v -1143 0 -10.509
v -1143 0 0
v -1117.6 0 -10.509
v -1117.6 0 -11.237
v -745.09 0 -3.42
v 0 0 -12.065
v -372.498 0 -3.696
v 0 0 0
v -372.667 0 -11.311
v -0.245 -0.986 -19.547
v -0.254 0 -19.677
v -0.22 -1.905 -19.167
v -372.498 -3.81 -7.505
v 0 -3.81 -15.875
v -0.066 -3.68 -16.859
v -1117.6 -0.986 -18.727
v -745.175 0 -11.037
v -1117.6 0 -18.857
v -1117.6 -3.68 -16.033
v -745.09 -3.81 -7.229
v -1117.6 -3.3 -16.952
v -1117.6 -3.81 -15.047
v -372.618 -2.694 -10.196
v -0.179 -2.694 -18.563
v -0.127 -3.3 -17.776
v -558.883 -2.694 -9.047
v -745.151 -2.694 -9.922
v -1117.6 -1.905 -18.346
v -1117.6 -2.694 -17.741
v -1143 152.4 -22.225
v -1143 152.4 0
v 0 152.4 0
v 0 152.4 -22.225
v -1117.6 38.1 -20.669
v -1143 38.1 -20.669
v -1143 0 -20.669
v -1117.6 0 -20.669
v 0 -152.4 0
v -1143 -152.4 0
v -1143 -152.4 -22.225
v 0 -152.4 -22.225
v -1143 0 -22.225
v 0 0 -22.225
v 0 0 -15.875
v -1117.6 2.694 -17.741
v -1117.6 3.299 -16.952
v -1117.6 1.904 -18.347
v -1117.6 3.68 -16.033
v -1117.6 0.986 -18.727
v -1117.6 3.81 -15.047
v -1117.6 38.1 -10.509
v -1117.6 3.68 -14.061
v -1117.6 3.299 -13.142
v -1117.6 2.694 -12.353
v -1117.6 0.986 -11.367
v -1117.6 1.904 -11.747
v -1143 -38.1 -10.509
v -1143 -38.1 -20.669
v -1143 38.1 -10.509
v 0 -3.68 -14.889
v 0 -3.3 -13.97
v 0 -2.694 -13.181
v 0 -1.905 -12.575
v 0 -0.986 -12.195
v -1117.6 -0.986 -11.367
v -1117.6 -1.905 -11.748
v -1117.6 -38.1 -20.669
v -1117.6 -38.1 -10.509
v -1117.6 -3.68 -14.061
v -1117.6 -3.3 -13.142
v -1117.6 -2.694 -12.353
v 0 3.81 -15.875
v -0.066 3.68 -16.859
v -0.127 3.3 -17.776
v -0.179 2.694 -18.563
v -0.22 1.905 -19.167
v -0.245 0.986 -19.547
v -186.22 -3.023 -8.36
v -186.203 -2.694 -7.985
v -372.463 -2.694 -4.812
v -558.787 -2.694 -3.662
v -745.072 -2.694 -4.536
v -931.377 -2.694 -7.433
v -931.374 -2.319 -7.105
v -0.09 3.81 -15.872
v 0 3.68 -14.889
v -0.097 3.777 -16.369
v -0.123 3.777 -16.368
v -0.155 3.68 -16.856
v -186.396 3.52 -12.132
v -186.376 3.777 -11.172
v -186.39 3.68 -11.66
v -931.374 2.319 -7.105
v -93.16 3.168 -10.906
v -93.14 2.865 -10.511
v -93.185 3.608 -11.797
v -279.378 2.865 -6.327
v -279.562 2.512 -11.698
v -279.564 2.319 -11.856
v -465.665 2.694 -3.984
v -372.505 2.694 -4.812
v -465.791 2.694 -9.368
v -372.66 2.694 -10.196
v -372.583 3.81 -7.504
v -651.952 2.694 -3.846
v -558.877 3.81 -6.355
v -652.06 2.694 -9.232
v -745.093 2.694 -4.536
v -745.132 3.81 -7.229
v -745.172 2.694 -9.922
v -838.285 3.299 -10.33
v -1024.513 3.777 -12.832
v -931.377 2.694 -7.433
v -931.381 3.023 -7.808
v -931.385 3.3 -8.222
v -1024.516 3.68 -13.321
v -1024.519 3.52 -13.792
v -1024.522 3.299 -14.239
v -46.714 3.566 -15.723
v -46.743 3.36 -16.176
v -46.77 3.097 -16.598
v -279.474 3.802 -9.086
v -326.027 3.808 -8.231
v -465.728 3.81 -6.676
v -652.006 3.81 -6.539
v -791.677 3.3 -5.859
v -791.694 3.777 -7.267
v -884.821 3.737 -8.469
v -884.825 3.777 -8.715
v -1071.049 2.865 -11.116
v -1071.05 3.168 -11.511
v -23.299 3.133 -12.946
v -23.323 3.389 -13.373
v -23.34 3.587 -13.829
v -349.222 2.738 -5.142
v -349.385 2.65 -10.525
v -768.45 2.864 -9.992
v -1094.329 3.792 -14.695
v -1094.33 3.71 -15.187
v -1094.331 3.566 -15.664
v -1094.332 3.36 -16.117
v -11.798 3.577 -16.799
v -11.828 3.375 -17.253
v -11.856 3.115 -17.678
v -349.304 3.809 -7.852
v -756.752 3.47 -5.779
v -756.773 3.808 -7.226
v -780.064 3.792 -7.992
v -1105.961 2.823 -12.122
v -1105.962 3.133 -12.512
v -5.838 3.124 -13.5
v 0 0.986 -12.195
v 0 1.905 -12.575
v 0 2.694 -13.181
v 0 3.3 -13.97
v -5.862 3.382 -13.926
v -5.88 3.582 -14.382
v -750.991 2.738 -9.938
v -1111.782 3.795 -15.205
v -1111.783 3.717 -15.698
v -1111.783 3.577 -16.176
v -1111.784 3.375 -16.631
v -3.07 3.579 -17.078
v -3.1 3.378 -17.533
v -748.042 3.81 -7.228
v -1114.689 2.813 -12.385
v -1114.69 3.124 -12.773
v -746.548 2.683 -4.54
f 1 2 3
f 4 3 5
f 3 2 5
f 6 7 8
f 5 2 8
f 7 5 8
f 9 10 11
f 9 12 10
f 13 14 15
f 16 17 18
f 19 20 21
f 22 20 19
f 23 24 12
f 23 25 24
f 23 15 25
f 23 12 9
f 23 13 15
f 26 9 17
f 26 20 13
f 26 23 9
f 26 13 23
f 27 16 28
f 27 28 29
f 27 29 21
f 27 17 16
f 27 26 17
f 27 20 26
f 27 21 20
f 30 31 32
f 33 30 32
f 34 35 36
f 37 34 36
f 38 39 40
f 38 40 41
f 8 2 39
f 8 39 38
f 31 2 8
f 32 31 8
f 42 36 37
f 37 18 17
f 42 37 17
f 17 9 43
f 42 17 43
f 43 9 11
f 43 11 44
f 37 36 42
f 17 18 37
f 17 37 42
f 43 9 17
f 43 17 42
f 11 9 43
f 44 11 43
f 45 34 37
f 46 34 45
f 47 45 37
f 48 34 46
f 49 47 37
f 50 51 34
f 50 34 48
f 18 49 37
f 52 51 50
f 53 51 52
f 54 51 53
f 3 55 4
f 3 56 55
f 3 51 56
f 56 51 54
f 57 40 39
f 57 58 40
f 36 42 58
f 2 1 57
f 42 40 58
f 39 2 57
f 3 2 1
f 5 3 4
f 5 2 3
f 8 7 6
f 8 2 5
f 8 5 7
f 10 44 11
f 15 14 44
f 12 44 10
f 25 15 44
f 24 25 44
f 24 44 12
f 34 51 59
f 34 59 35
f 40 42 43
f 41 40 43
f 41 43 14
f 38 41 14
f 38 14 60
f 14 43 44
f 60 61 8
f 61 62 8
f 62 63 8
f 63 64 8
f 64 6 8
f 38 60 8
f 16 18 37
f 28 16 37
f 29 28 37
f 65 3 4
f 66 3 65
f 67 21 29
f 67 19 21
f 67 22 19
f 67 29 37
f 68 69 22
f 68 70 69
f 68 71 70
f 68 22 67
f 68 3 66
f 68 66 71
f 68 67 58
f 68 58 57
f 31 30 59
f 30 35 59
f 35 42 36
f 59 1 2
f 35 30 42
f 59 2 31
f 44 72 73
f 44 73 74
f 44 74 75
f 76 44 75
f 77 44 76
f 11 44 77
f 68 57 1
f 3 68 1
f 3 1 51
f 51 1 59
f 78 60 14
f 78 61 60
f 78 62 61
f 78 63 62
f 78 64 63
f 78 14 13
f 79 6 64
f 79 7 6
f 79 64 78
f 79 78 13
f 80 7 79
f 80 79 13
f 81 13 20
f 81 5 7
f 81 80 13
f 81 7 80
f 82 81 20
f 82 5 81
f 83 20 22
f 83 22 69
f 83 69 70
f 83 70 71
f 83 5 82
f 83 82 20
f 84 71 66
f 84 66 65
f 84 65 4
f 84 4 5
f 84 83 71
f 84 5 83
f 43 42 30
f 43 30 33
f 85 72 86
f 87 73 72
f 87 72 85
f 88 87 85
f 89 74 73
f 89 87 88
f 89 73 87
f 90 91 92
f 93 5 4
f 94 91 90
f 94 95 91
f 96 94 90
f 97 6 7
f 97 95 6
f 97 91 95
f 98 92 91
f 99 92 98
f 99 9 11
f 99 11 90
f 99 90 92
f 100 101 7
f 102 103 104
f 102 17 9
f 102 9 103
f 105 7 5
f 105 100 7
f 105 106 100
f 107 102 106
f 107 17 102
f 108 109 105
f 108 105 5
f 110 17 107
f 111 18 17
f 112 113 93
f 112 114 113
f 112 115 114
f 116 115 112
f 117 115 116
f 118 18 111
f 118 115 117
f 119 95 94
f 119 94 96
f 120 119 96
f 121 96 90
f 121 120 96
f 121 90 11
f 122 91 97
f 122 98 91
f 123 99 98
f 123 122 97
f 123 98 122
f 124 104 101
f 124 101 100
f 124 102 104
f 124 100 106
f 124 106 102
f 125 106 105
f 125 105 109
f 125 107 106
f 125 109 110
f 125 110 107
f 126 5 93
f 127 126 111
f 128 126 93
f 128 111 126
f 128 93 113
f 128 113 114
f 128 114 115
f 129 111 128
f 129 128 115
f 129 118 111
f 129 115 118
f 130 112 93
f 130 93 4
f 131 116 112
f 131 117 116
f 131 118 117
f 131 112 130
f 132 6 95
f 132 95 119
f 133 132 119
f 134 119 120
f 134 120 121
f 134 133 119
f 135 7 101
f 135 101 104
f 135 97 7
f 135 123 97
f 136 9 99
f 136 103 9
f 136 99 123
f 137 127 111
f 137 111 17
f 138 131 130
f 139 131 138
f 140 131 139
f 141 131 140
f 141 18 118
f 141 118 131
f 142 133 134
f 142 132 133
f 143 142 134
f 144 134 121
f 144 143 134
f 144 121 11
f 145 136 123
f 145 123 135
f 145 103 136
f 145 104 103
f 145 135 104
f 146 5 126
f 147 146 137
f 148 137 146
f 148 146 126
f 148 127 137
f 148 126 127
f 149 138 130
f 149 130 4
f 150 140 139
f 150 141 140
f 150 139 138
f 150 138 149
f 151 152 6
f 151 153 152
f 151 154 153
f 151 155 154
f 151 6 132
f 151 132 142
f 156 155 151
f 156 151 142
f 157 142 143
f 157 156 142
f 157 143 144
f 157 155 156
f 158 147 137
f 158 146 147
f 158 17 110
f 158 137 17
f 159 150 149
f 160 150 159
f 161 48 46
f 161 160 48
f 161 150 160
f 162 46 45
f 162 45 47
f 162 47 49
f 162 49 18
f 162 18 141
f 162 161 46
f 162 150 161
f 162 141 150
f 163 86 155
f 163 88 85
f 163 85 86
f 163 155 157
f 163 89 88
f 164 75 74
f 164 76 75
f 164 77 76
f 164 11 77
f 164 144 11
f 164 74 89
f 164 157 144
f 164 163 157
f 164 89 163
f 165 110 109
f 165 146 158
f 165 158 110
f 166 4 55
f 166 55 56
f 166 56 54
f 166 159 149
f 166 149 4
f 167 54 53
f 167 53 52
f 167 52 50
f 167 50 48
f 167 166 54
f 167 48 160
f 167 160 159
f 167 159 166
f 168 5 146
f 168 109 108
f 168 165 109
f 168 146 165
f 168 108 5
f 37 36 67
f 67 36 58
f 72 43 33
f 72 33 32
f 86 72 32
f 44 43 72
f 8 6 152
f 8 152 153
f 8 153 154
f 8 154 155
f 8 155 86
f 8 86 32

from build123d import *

# Parameters (mm, degrees)
F0_W      = 1143
F0_H      = 22.225
F1_DEPTH  = 152.4
F1_FACE_W = 1143
F1_FACE_H = 22.225
F2_DEPTH  = 152.4
F6_DEPTH  = 25.4


with BuildPart() as f1:
    # F0 (on Front) → F1 (new body)
    with BuildSketch(Plane.XZ):
        with Locations((-571.5, -11.1125)):
            Rectangle(F0_W, F0_H)
    extrude(amount=-F1_DEPTH)


with BuildPart() as f2:
    # F1_face (on face) → F2 (new body)
    with BuildSketch(Plane(origin=(-571.5, 0, -11.1125), x_dir=(1, 0, 0), z_dir=(0, -1, 0))):
        Rectangle(F1_FACE_W, F1_FACE_H)
    extrude(amount=F2_DEPTH)


with BuildPart() as f5_tool:
    # F5: sweep along a path in F3
    with BuildLine(Plane.XZ) as f5_path:
        ThreePointArc((0, -15.875), (-571.5, -6.35), (-1143, -15.875))
    # F4 (on face) → F5 (sweep)
    with BuildSketch(Plane(origin=(-1143, 0, 0), x_dir=(0, -1, 0), z_dir=(-1, 0, 0))):
        with BuildLine():
            Line((0, -19.685), (0, -12.065))
            ThreePointArc((0, -12.065), (-3.81, -15.875), (0, -19.685))
        make_face()
        with BuildLine():
            ThreePointArc((0, -19.685), (2.694077, -18.569077), (3.81, -15.875))
            ThreePointArc((3.81, -15.875), (2.694077, -13.180923), (0, -12.065))
            Line((0, -12.065), (0, -19.685))
        make_face()
    sweep(path=f5_path.line)


with BuildPart() as f1_1:
    add(f1.part)

    # F5: cut by f5_tool
    add(f5_tool.part, mode=Mode.SUBTRACT)


with BuildPart() as f2_1:
    add(f2.part)

    # F5: cut by f5_tool
    add(f5_tool.part, mode=Mode.SUBTRACT)


with BuildPart() as f6_tool:
    # F4 (on face) → F6 (new body)
    with BuildSketch(Plane(origin=(-1143, 0, 0), x_dir=(0, -1, 0), z_dir=(-1, 0, 0))):
        with BuildLine():
            ThreePointArc((0, -19.685), (-3.81, -15.875), (0, -12.065))
            Line((0, -12.065), (0, -10.508593))
            Line((0, -10.508593), (-38.1, -10.508593))
            Line((-38.1, -10.508593), (-38.1, -20.668593))
            Line((-38.1, -20.668593), (0, -20.668593))
            Line((0, -20.668593), (0, -19.685))
        make_face()
        with BuildLine():
            ThreePointArc((0, -12.065), (2.694077, -13.180923), (3.81, -15.875))
            ThreePointArc((3.81, -15.875), (2.694077, -18.569077), (0, -19.685))
            Line((0, -19.685), (0, -20.668593))
            Line((0, -20.668593), (38.1, -20.668593))
            Line((38.1, -20.668593), (38.1, -10.508593))
            Line((38.1, -10.508593), (0, -10.508593))
            Line((0, -10.508593), (0, -12.065))
        make_face()
        with BuildLine():
            ThreePointArc((0, -19.685), (2.694077, -18.569077), (3.81, -15.875))
            ThreePointArc((3.81, -15.875), (2.694077, -13.180923), (0, -12.065))
            Line((0, -12.065), (0, -19.685))
        make_face()
        with BuildLine():
            Line((0, -19.685), (0, -12.065))
            ThreePointArc((0, -12.065), (-3.81, -15.875), (0, -19.685))
        make_face()
    extrude(amount=-F6_DEPTH)


with BuildPart() as f1_2:
    add(f1_1.part)

    # F6: cut by f6_tool
    add(f6_tool.part, mode=Mode.SUBTRACT)


with BuildPart() as f2_2:
    add(f2_1.part)

    # F6: cut by f6_tool
    add(f6_tool.part, mode=Mode.SUBTRACT)


solid = Compound([f1_2.part, f2_2.part])
